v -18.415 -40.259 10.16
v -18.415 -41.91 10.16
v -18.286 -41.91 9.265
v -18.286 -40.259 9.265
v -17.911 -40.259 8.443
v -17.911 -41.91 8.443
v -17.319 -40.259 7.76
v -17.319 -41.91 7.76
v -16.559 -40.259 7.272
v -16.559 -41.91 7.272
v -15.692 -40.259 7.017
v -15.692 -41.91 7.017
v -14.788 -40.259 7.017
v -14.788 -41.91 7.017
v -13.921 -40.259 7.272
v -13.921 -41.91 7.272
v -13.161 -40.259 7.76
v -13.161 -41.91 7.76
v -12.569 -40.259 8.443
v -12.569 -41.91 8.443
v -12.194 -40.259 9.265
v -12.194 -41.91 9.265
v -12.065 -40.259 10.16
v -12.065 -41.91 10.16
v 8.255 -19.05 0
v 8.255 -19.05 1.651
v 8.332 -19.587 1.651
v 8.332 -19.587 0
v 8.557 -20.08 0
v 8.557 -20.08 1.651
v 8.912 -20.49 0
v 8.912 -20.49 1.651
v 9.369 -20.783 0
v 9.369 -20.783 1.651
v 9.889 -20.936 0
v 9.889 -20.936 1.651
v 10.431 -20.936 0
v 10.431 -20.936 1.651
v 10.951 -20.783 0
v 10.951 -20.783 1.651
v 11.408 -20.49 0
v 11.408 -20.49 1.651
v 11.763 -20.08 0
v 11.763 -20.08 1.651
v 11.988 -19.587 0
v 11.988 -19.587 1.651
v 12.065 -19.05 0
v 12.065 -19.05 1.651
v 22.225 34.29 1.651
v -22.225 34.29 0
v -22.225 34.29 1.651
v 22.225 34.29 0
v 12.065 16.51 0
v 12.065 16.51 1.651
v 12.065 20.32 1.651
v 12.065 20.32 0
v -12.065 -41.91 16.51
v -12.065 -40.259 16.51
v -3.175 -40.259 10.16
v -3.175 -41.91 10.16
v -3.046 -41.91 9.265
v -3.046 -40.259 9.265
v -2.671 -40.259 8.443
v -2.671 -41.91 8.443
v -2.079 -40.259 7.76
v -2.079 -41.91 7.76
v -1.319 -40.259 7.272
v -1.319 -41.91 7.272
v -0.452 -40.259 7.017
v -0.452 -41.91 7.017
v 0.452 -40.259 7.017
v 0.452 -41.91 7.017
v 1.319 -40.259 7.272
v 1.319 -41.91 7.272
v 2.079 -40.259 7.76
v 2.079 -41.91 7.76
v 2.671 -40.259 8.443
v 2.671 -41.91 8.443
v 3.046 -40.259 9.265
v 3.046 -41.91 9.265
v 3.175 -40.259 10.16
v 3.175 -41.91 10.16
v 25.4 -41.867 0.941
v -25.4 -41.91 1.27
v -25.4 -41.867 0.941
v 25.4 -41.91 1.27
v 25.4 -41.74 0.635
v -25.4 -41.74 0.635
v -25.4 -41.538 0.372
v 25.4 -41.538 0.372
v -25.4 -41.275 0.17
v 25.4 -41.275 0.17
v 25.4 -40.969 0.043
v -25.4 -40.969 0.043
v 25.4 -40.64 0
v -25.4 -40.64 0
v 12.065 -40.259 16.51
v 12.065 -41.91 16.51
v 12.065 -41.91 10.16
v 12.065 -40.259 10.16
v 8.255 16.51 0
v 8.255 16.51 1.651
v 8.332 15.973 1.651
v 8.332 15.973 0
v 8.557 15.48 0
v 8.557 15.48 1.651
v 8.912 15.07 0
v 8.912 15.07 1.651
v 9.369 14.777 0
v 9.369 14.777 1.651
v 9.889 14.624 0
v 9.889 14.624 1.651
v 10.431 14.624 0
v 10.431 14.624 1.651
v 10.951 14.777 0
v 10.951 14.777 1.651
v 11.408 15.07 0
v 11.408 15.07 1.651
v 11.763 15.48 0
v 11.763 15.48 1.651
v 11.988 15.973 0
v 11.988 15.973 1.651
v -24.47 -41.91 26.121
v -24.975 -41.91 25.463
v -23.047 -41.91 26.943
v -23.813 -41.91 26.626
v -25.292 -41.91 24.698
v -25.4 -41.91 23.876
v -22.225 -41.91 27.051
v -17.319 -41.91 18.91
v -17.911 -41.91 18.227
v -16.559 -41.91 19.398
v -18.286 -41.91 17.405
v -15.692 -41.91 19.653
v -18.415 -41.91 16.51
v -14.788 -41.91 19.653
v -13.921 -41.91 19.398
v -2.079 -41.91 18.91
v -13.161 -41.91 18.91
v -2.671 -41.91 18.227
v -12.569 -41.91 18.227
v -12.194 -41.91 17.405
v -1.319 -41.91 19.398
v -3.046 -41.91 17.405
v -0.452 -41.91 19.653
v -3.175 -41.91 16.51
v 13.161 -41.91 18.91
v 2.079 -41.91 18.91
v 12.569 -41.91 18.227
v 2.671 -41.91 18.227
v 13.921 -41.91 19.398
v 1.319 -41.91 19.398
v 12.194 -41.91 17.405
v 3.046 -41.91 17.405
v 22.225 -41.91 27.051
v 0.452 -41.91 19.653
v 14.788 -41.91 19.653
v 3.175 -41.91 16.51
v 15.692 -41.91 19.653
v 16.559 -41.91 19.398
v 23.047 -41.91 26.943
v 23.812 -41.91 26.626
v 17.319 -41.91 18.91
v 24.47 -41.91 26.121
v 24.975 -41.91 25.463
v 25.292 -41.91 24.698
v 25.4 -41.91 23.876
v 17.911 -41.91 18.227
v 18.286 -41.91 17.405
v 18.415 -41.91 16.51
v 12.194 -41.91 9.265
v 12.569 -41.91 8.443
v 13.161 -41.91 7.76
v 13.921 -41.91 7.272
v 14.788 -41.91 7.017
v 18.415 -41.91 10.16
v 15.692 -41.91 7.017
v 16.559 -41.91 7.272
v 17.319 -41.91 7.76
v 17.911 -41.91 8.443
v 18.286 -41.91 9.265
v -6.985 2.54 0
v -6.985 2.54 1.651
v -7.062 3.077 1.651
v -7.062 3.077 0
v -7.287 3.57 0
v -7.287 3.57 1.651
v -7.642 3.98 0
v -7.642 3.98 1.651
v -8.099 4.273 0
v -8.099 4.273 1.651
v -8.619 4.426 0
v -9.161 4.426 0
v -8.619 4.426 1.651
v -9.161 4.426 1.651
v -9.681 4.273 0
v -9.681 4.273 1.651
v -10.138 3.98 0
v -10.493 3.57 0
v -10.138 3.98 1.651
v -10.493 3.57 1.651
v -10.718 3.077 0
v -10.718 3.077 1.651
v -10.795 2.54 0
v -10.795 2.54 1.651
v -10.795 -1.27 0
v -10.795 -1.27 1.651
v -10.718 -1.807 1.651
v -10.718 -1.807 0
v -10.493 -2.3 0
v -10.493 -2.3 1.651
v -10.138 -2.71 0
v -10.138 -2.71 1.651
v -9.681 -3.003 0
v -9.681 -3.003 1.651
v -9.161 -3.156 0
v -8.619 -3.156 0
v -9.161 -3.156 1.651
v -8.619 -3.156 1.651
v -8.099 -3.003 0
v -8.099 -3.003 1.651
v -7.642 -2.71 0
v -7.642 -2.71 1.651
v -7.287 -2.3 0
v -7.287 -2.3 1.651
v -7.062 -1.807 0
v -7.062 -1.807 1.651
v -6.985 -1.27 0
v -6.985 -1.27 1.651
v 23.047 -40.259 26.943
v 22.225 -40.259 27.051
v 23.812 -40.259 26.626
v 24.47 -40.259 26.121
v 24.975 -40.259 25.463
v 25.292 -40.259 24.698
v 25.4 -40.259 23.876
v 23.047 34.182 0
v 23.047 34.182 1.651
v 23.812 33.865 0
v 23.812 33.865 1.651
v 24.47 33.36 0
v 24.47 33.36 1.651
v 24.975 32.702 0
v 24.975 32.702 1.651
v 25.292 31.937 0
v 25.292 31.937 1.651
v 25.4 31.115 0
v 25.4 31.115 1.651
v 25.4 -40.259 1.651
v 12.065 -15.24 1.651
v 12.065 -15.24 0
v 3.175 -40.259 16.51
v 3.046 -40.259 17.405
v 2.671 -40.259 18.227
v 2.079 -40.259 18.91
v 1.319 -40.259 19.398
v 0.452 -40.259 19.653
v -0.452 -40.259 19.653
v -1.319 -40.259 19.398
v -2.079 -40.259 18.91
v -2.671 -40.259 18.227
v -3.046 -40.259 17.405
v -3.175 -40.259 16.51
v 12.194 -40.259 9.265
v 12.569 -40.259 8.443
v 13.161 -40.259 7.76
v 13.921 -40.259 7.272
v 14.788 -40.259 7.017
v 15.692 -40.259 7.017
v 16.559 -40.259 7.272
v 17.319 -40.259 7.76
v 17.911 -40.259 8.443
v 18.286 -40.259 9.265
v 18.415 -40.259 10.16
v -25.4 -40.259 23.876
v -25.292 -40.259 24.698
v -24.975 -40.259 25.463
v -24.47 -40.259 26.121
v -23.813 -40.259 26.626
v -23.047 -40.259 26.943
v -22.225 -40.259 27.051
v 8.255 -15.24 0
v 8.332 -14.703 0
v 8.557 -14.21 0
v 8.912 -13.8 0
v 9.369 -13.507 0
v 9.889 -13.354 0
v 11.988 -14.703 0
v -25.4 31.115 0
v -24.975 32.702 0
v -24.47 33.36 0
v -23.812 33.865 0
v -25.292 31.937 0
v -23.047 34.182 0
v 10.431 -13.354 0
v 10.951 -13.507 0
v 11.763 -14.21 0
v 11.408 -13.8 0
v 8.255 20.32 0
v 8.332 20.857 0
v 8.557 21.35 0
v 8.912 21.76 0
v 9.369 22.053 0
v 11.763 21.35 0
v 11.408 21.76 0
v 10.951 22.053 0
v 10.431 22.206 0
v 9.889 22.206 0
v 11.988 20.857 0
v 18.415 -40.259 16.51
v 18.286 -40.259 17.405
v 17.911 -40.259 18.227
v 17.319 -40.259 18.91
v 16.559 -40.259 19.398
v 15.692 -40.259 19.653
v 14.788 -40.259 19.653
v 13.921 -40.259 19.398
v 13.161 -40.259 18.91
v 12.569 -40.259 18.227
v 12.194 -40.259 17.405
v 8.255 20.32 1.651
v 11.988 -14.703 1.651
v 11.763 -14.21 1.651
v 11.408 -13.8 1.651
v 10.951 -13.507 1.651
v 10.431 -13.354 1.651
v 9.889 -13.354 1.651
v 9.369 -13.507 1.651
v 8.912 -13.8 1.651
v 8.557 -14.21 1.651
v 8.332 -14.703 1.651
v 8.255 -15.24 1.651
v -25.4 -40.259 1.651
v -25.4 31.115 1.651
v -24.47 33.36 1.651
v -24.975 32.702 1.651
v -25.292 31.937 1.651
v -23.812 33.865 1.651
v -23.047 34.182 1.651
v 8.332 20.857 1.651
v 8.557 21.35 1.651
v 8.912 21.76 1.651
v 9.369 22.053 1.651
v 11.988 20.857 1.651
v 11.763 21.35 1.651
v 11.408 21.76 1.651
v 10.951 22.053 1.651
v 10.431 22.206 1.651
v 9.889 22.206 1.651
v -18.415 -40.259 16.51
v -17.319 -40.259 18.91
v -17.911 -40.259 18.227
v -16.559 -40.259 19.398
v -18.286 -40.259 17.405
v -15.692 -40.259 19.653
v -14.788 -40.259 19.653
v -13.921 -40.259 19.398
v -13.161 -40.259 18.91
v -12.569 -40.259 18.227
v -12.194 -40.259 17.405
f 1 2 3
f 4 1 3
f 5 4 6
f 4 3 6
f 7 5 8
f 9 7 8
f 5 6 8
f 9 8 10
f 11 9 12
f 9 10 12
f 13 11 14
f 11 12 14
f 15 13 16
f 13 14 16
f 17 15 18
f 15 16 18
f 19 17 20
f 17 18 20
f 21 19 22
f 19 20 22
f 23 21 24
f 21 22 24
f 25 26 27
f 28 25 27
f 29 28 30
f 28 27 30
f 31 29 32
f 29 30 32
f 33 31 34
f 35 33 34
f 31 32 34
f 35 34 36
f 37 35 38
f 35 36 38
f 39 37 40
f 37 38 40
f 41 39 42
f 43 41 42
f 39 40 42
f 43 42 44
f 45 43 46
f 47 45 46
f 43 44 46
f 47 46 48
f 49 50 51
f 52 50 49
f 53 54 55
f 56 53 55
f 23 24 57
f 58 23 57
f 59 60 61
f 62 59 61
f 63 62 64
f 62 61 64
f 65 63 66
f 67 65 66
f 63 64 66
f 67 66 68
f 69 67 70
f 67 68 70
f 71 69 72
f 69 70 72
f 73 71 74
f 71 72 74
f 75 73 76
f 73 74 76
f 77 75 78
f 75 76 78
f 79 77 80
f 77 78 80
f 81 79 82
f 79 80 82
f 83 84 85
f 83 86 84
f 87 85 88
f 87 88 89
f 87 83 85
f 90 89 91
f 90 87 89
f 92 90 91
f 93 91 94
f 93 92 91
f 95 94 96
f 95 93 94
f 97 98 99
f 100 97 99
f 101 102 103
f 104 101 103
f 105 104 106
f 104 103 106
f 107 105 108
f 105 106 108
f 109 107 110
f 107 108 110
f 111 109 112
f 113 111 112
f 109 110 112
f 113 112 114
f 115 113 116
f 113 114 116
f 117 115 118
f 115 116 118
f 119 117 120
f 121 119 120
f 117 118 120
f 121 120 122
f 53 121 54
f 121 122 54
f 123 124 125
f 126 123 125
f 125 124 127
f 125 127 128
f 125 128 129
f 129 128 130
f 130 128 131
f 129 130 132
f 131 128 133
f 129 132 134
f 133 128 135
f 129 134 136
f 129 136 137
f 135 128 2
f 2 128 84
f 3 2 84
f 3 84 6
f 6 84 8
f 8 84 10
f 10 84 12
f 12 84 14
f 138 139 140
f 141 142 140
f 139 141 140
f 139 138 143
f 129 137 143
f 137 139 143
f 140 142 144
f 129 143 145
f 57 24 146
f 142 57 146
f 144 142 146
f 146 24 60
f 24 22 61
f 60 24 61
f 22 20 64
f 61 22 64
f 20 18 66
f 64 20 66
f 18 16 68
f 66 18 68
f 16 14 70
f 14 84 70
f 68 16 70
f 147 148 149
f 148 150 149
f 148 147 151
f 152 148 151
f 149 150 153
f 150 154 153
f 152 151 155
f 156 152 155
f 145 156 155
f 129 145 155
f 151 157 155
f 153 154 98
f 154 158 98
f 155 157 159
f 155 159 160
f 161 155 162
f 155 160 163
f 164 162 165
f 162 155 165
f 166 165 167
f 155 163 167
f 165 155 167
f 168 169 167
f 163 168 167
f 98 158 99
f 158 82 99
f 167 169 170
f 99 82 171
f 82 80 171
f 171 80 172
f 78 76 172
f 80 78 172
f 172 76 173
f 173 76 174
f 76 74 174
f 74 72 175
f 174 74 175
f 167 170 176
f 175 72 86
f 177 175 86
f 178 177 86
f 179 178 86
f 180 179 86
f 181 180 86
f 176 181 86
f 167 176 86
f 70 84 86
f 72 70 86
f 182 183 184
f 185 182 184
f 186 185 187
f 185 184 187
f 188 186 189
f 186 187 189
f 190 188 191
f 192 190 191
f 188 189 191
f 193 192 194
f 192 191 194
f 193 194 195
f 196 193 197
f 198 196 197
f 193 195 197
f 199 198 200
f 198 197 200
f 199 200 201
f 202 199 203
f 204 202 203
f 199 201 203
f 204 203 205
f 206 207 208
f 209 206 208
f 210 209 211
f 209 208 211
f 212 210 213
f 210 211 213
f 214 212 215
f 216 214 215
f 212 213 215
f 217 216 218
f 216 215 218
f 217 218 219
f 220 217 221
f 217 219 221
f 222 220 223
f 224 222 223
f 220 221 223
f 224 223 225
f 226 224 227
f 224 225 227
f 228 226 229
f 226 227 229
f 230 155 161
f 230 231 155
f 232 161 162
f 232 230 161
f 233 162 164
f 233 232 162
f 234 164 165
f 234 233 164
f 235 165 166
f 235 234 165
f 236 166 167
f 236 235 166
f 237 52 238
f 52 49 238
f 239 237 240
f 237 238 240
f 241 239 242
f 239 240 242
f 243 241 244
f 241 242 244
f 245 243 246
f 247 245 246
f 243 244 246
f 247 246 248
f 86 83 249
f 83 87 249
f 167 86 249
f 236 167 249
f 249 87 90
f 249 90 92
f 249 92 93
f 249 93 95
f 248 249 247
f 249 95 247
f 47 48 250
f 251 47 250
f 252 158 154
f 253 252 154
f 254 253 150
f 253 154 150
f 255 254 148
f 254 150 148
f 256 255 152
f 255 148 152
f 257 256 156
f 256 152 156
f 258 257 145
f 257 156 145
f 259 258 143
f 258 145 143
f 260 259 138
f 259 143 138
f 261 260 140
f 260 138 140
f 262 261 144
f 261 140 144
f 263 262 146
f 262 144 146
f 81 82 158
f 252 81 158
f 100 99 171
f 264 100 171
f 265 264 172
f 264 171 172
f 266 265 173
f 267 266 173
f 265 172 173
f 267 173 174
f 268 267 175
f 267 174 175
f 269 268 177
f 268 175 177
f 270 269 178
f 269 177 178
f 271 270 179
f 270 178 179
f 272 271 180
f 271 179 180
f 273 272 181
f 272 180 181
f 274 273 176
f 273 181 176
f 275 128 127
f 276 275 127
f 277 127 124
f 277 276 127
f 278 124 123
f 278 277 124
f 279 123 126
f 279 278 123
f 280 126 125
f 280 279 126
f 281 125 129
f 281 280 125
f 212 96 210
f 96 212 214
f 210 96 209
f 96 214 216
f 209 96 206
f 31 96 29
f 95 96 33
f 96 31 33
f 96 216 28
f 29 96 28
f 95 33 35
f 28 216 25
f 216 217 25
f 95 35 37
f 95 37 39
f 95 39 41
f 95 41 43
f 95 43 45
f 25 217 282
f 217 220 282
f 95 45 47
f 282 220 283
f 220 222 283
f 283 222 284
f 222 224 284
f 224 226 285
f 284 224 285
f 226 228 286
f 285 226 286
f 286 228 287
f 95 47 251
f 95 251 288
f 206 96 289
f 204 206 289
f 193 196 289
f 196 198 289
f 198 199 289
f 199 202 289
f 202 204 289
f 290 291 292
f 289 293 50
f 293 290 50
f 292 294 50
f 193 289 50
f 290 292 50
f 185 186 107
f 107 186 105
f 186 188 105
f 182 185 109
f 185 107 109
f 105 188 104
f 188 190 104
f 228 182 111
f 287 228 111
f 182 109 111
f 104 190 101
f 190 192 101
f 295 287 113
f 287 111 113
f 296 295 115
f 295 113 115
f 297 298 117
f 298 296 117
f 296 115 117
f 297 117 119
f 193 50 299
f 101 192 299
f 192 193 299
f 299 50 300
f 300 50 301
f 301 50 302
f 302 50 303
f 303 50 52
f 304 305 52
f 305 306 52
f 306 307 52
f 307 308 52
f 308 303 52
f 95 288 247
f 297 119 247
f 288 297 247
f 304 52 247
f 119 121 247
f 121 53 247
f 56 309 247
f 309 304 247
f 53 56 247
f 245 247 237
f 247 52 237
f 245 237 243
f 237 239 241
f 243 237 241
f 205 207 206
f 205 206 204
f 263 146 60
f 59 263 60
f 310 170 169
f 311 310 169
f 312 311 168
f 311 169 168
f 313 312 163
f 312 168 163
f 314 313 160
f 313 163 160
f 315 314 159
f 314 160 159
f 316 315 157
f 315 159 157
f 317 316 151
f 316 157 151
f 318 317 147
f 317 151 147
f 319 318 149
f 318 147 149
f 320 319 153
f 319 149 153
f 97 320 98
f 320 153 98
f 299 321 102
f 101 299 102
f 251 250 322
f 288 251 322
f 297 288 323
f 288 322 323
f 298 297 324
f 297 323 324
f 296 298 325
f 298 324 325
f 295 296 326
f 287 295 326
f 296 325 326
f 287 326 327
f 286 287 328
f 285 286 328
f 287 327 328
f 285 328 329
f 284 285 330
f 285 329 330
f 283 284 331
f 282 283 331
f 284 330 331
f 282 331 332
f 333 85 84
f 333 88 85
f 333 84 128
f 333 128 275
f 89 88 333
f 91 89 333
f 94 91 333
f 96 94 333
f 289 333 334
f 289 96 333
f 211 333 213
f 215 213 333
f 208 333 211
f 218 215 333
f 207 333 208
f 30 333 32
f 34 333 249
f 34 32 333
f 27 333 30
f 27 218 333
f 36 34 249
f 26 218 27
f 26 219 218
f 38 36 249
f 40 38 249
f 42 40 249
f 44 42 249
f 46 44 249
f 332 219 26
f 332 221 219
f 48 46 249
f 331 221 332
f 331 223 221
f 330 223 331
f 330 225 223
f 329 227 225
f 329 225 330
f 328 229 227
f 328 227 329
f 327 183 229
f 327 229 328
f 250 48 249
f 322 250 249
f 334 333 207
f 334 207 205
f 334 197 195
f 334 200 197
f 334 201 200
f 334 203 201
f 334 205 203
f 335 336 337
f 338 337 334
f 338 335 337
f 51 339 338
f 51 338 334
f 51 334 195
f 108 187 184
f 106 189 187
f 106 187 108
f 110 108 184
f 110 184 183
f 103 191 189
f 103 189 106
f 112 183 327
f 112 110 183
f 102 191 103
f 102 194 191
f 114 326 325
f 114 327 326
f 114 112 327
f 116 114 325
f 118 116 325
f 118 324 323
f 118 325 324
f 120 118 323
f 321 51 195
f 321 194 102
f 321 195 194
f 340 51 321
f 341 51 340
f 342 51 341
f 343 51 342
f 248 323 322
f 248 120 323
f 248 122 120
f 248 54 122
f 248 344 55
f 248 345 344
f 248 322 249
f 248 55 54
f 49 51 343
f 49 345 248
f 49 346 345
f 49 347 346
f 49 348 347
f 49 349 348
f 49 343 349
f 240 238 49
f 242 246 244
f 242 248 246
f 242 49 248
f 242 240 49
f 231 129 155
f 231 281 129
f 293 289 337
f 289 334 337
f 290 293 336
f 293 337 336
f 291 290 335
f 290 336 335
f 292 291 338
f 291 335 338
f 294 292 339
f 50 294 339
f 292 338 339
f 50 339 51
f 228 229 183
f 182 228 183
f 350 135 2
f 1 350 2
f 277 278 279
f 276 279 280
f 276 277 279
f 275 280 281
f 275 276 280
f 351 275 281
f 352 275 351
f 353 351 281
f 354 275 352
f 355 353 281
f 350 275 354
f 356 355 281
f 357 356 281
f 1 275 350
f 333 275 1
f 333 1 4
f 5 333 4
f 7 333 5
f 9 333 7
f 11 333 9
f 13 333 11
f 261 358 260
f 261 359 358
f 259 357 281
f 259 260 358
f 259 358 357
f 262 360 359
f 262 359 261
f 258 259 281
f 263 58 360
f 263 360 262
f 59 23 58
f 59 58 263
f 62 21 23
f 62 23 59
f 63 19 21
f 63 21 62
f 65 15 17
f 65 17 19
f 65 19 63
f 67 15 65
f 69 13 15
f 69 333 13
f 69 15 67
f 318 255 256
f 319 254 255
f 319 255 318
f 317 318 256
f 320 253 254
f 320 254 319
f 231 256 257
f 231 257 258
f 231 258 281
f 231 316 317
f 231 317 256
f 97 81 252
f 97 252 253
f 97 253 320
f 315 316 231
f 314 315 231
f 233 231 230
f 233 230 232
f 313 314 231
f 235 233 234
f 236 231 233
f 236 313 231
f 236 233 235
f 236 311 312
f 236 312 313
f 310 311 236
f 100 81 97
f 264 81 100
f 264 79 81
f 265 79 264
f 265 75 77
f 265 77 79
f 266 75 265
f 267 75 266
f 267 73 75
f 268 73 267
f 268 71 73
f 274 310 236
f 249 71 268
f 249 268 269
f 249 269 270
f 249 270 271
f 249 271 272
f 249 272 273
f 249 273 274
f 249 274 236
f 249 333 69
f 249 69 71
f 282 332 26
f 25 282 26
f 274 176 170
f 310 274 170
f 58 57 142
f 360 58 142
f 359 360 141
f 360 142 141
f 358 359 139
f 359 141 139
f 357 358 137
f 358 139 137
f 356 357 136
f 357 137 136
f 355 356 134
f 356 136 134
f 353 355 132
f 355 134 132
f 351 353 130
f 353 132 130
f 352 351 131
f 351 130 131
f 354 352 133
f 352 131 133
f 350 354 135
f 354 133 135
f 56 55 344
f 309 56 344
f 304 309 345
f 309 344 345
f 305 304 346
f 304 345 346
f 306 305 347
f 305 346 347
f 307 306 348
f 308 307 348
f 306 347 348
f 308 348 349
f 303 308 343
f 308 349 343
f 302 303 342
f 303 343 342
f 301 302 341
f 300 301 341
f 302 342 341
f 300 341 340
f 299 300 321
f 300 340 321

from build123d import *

# Parameters (mm, degrees)
F0_W     = 50.8
F0_H     = 76.2
F1_DEPTH = 1.651
F2_W     = 50.8
F2_H     = 1.651
F3_DEPTH = 25.4
F4_R     = 1.27
F5_R     = 3.175
F6_W     = 1.905
F6_H     = 3.81
F7_DEPTH = 25.4
F9_DEPTH = 25.4


# Not quite as in the source:
# - a feature names something its author has since deleted; it is built from what else it names


with BuildPart() as f1:
    # F0 (on Top) → F1 (new body)
    with BuildSketch(Plane.XY):
        with Locations((0, -3.81)):
            Rectangle(F0_W, F0_H)
    extrude(amount=F1_DEPTH)

    # F2 (on face) → F3 (join)
    with BuildSketch(Plane.XY.offset(1.651)):
        with Locations((0, -41.0845)):
            Rectangle(F2_W, F2_H)
    extrude(amount=F3_DEPTH)

    # F4
    f4_edges = [f1.edges().sort_by_distance(p)[0] for p in [
        (0, -41.91, 0),
    ]]
    fillet(f4_edges, radius=F4_R)

    # F5
    f5_edges = [f1.edges().sort_by_distance(p)[0] for p in [
        (25.4, 34.29, 0.8255),
        (-25.4, 34.29, 0.8255),
        (25.4, -41.0845, 27.051),
        (-25.4, -41.0845, 27.051),
    ]]
    fillet(f5_edges, radius=F5_R)

    # F6 (on face) → F7 (cut)
    with BuildSketch(Plane.XY.offset(1.651)):
        with BuildLine():
            Line((-6.985, -1.27), (-6.985, 2.54))
            ThreePointArc((-6.985, 2.54), (-8.89, 4.445), (-10.795, 2.54))
            Line((-10.795, 2.54), (-8.89, 2.54))
            Line((-8.89, 2.54), (-8.89, -1.27))
            Line((-8.89, -1.27), (-10.795, -1.27))
            ThreePointArc((-10.795, -1.27), (-8.89, -3.175), (-6.985, -1.27))
        make_face()
        with Locations((-9.8425, 0.635)):
            Rectangle(F6_W, F6_H)
        with BuildLine():
            ThreePointArc((8.255, 16.51), (10.16, 14.605), (12.065, 16.51))
            Line((12.065, 16.51), (12.065, 20.32))
            ThreePointArc((12.065, 20.32), (10.16, 22.225), (8.255, 20.32))
            Line((8.255, 20.32), (8.255, 16.51))
        make_face()
        with BuildLine():
            ThreePointArc((12.065, -15.24), (10.16, -13.335), (8.255, -15.24))
            Line((8.255, -15.24), (8.255, -19.05))
            ThreePointArc((8.255, -19.05), (10.16, -20.955), (12.065, -19.05))
            Line((12.065, -19.05), (12.065, -15.24))
        make_face()
    extrude(amount=-F7_DEPTH, mode=Mode.SUBTRACT)

    # F8 (on face) → F9 (cut)
    with BuildSketch(Plane.XZ.offset(41.91)):
        with BuildLine():
            ThreePointArc((-12.065, 16.51), (-15.24, 19.685), (-18.415, 16.51))
            Line((-18.415, 16.51), (-18.415, 10.16))
            ThreePointArc((-18.415, 10.16), (-15.24, 6.985), (-12.065, 10.16))
            Line((-12.065, 10.16), (-12.065, 16.51))
        make_face()
        with BuildLine():
            Line((3.175, 10.16), (3.175, 16.51))
            ThreePointArc((3.175, 16.51), (0, 19.685), (-3.175, 16.51))
            Line((-3.175, 16.51), (-3.175, 10.16))
            ThreePointArc((-3.175, 10.16), (0, 6.985), (3.175, 10.16))
        make_face()
        with BuildLine():
            Line((18.415, 10.16), (18.415, 16.51))
            ThreePointArc((18.415, 16.51), (15.24, 19.685), (12.065, 16.51))
            Line((12.065, 16.51), (12.065, 10.16))
            ThreePointArc((12.065, 10.16), (15.24, 6.985), (18.415, 10.16))
        make_face()
    extrude(amount=-F9_DEPTH, mode=Mode.SUBTRACT)


solid = f1.part
